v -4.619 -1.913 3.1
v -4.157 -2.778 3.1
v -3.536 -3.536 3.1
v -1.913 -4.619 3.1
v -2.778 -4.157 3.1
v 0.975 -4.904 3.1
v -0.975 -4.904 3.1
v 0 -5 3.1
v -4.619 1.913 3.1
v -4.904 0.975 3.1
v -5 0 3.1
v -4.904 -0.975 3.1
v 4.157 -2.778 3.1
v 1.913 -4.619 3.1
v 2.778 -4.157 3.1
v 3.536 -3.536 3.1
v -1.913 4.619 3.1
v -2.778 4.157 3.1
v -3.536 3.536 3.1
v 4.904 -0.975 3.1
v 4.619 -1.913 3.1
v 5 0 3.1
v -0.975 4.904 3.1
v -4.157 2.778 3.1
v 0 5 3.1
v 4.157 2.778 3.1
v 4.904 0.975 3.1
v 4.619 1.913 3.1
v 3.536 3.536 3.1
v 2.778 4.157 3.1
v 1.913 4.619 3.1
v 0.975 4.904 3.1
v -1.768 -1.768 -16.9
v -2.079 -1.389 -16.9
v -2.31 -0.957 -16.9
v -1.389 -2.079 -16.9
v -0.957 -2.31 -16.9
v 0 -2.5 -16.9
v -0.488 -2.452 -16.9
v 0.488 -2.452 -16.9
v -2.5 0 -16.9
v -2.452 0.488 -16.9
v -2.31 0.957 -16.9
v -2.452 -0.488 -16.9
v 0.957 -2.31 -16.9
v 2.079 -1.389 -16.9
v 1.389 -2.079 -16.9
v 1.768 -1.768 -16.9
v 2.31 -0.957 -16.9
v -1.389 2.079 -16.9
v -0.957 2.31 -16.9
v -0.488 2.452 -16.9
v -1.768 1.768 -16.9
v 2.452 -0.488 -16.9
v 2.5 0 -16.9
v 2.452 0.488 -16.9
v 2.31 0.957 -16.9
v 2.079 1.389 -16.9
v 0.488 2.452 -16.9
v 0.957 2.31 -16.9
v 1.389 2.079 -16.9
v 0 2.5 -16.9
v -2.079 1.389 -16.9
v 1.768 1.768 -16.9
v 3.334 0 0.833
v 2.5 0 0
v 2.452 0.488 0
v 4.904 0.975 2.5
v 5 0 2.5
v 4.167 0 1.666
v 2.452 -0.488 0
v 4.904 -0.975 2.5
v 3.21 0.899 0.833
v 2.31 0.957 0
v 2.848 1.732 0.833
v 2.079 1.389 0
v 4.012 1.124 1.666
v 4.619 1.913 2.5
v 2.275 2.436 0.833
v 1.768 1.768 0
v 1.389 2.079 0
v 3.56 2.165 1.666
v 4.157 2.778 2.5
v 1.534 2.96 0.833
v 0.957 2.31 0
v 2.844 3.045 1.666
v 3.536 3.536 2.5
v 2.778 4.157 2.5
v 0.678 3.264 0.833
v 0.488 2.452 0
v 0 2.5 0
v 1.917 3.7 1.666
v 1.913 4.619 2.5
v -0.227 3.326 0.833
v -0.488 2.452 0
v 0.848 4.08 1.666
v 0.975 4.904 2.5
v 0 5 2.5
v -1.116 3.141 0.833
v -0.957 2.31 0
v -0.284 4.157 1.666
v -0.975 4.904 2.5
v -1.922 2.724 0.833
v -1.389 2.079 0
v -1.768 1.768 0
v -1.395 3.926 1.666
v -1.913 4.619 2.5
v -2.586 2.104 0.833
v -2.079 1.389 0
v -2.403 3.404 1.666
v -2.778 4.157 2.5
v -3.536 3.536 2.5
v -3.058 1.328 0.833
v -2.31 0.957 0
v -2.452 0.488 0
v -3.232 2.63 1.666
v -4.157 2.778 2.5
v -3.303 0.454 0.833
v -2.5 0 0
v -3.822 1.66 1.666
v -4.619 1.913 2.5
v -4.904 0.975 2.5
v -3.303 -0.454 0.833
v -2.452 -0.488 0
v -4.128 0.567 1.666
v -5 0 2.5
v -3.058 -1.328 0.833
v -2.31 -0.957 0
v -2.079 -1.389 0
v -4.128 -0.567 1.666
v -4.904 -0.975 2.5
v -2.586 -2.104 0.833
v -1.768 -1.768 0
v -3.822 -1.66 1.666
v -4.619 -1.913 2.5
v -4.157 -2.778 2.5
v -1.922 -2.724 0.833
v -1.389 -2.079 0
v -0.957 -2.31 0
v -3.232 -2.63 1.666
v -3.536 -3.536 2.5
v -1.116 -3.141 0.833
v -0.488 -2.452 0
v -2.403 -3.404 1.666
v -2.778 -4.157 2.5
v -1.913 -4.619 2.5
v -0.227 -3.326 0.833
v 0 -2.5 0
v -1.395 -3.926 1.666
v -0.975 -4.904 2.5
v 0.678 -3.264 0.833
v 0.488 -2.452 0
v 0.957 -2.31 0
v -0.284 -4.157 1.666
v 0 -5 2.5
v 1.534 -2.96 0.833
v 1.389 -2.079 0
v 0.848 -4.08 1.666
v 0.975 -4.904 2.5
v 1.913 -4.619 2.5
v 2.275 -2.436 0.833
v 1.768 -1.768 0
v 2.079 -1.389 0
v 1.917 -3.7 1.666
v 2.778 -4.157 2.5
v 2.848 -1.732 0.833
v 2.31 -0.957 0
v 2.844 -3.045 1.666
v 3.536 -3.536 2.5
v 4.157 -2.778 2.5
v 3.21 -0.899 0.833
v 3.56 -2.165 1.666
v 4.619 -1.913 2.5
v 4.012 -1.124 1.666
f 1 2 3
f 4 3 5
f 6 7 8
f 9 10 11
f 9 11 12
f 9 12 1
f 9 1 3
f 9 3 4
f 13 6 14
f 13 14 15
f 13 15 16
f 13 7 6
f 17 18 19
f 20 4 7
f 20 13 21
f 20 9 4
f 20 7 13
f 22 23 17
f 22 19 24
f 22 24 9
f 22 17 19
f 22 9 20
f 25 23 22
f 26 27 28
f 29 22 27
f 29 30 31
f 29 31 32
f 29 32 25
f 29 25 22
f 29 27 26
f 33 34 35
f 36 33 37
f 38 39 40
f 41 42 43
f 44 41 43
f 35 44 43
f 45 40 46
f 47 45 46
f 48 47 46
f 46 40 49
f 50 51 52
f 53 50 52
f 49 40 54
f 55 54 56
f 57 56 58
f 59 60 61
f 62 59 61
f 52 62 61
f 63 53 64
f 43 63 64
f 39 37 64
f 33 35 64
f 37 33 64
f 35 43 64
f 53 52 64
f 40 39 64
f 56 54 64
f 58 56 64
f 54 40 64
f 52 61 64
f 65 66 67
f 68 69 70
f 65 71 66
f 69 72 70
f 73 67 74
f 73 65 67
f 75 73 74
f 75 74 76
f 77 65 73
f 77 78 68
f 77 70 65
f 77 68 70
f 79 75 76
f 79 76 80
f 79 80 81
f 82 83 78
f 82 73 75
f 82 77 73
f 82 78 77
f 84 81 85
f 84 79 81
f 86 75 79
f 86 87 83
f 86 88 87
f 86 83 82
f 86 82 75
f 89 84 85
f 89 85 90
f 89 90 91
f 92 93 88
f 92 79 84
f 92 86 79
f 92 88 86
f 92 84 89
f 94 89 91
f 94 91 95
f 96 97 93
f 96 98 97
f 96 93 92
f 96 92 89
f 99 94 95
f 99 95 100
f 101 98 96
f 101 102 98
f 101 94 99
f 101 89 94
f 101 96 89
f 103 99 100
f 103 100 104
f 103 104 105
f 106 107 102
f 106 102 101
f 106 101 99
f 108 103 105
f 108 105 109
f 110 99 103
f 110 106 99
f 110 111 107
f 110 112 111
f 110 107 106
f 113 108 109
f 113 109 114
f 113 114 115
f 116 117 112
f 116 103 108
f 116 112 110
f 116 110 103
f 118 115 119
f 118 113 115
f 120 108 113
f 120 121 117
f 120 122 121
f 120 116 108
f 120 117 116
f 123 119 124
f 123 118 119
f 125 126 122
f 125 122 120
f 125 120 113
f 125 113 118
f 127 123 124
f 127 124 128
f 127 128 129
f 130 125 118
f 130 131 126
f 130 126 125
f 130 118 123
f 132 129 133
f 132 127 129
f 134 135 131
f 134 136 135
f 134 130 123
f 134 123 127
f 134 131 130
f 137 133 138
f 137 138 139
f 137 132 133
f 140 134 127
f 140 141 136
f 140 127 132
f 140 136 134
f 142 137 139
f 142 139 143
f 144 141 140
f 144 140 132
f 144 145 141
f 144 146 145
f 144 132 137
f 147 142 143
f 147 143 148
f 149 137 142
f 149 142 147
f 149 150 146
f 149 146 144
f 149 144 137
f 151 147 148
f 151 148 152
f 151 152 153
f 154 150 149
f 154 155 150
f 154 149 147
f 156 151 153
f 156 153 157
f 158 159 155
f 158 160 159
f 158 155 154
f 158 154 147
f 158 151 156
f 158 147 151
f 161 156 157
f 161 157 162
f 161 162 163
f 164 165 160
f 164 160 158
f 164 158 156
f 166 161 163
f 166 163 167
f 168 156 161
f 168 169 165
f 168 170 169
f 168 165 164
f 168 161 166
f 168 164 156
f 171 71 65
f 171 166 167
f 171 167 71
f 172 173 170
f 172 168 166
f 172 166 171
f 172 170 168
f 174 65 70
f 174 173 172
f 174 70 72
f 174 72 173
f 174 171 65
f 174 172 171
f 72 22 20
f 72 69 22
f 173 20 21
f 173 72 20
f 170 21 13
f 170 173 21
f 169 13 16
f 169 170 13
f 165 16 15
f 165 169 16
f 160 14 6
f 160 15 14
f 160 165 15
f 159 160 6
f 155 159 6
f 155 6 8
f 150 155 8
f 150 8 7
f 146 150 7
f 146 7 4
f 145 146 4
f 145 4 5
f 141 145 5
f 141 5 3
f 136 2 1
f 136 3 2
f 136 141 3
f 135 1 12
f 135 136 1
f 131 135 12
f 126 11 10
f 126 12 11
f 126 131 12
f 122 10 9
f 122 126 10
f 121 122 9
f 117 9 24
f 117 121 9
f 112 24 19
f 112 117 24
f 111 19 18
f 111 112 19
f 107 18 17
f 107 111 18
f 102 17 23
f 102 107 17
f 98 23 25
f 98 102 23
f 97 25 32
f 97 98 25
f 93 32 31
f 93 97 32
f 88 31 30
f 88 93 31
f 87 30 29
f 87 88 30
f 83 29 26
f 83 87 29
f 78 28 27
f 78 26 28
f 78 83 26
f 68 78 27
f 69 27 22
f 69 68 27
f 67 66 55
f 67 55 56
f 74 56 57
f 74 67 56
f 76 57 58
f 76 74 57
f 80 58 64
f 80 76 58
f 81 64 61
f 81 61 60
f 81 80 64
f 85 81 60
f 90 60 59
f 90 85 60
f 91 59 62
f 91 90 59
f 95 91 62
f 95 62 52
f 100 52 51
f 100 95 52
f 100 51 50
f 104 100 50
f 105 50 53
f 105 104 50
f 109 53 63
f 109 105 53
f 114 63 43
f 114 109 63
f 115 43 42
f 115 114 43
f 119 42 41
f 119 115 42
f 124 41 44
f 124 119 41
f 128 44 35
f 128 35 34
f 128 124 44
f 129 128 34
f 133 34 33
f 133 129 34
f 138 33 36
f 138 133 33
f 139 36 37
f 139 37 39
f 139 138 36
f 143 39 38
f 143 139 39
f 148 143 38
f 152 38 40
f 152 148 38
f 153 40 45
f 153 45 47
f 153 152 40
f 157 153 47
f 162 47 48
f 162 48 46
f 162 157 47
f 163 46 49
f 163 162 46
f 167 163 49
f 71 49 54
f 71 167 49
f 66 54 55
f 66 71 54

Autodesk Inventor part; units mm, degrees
ref_plane "YZ Plane" through (0, 0, 0) normal (1, 0, 0) x (0, 1, 0)
ref_plane "XZ Plane" through (0, 0, 0) normal (0, 1, 0) x (-1, 0, 0)
ref_plane "XY Plane" through (0, 0, 0) normal (0, 0, 1) x (1, 0, 0)
sketch "スケッチ1" plane through (0, 0, 0) normal (0, 0, 1) x (1, 0, 0)
  circle A0 centre (0, 0) radius 5
  dimension "d0" = 10
extrude "押し出し1" add sketch "スケッチ1" along normal blind 3.1
sketch "スケッチ2" plane through (0, 0, 3.1) normal (0, 0, 1) x (1, 0, 0)
  circle A0 centre (0, 0) radius 2.5
  dimension "d3" = 5
extrude "押し出し2" add sketch "スケッチ2" against normal blind 20
chamfer "面取り1" distance 2.5 angle 45 1 edges at (-5, 0, 0)
thread "ねじ1" size "M5x0.8" class "6g" standard "ANSI Metric M Profile" full length
properties part number "ネジ皿m5,20" material "鋼、高強度、低合金"
